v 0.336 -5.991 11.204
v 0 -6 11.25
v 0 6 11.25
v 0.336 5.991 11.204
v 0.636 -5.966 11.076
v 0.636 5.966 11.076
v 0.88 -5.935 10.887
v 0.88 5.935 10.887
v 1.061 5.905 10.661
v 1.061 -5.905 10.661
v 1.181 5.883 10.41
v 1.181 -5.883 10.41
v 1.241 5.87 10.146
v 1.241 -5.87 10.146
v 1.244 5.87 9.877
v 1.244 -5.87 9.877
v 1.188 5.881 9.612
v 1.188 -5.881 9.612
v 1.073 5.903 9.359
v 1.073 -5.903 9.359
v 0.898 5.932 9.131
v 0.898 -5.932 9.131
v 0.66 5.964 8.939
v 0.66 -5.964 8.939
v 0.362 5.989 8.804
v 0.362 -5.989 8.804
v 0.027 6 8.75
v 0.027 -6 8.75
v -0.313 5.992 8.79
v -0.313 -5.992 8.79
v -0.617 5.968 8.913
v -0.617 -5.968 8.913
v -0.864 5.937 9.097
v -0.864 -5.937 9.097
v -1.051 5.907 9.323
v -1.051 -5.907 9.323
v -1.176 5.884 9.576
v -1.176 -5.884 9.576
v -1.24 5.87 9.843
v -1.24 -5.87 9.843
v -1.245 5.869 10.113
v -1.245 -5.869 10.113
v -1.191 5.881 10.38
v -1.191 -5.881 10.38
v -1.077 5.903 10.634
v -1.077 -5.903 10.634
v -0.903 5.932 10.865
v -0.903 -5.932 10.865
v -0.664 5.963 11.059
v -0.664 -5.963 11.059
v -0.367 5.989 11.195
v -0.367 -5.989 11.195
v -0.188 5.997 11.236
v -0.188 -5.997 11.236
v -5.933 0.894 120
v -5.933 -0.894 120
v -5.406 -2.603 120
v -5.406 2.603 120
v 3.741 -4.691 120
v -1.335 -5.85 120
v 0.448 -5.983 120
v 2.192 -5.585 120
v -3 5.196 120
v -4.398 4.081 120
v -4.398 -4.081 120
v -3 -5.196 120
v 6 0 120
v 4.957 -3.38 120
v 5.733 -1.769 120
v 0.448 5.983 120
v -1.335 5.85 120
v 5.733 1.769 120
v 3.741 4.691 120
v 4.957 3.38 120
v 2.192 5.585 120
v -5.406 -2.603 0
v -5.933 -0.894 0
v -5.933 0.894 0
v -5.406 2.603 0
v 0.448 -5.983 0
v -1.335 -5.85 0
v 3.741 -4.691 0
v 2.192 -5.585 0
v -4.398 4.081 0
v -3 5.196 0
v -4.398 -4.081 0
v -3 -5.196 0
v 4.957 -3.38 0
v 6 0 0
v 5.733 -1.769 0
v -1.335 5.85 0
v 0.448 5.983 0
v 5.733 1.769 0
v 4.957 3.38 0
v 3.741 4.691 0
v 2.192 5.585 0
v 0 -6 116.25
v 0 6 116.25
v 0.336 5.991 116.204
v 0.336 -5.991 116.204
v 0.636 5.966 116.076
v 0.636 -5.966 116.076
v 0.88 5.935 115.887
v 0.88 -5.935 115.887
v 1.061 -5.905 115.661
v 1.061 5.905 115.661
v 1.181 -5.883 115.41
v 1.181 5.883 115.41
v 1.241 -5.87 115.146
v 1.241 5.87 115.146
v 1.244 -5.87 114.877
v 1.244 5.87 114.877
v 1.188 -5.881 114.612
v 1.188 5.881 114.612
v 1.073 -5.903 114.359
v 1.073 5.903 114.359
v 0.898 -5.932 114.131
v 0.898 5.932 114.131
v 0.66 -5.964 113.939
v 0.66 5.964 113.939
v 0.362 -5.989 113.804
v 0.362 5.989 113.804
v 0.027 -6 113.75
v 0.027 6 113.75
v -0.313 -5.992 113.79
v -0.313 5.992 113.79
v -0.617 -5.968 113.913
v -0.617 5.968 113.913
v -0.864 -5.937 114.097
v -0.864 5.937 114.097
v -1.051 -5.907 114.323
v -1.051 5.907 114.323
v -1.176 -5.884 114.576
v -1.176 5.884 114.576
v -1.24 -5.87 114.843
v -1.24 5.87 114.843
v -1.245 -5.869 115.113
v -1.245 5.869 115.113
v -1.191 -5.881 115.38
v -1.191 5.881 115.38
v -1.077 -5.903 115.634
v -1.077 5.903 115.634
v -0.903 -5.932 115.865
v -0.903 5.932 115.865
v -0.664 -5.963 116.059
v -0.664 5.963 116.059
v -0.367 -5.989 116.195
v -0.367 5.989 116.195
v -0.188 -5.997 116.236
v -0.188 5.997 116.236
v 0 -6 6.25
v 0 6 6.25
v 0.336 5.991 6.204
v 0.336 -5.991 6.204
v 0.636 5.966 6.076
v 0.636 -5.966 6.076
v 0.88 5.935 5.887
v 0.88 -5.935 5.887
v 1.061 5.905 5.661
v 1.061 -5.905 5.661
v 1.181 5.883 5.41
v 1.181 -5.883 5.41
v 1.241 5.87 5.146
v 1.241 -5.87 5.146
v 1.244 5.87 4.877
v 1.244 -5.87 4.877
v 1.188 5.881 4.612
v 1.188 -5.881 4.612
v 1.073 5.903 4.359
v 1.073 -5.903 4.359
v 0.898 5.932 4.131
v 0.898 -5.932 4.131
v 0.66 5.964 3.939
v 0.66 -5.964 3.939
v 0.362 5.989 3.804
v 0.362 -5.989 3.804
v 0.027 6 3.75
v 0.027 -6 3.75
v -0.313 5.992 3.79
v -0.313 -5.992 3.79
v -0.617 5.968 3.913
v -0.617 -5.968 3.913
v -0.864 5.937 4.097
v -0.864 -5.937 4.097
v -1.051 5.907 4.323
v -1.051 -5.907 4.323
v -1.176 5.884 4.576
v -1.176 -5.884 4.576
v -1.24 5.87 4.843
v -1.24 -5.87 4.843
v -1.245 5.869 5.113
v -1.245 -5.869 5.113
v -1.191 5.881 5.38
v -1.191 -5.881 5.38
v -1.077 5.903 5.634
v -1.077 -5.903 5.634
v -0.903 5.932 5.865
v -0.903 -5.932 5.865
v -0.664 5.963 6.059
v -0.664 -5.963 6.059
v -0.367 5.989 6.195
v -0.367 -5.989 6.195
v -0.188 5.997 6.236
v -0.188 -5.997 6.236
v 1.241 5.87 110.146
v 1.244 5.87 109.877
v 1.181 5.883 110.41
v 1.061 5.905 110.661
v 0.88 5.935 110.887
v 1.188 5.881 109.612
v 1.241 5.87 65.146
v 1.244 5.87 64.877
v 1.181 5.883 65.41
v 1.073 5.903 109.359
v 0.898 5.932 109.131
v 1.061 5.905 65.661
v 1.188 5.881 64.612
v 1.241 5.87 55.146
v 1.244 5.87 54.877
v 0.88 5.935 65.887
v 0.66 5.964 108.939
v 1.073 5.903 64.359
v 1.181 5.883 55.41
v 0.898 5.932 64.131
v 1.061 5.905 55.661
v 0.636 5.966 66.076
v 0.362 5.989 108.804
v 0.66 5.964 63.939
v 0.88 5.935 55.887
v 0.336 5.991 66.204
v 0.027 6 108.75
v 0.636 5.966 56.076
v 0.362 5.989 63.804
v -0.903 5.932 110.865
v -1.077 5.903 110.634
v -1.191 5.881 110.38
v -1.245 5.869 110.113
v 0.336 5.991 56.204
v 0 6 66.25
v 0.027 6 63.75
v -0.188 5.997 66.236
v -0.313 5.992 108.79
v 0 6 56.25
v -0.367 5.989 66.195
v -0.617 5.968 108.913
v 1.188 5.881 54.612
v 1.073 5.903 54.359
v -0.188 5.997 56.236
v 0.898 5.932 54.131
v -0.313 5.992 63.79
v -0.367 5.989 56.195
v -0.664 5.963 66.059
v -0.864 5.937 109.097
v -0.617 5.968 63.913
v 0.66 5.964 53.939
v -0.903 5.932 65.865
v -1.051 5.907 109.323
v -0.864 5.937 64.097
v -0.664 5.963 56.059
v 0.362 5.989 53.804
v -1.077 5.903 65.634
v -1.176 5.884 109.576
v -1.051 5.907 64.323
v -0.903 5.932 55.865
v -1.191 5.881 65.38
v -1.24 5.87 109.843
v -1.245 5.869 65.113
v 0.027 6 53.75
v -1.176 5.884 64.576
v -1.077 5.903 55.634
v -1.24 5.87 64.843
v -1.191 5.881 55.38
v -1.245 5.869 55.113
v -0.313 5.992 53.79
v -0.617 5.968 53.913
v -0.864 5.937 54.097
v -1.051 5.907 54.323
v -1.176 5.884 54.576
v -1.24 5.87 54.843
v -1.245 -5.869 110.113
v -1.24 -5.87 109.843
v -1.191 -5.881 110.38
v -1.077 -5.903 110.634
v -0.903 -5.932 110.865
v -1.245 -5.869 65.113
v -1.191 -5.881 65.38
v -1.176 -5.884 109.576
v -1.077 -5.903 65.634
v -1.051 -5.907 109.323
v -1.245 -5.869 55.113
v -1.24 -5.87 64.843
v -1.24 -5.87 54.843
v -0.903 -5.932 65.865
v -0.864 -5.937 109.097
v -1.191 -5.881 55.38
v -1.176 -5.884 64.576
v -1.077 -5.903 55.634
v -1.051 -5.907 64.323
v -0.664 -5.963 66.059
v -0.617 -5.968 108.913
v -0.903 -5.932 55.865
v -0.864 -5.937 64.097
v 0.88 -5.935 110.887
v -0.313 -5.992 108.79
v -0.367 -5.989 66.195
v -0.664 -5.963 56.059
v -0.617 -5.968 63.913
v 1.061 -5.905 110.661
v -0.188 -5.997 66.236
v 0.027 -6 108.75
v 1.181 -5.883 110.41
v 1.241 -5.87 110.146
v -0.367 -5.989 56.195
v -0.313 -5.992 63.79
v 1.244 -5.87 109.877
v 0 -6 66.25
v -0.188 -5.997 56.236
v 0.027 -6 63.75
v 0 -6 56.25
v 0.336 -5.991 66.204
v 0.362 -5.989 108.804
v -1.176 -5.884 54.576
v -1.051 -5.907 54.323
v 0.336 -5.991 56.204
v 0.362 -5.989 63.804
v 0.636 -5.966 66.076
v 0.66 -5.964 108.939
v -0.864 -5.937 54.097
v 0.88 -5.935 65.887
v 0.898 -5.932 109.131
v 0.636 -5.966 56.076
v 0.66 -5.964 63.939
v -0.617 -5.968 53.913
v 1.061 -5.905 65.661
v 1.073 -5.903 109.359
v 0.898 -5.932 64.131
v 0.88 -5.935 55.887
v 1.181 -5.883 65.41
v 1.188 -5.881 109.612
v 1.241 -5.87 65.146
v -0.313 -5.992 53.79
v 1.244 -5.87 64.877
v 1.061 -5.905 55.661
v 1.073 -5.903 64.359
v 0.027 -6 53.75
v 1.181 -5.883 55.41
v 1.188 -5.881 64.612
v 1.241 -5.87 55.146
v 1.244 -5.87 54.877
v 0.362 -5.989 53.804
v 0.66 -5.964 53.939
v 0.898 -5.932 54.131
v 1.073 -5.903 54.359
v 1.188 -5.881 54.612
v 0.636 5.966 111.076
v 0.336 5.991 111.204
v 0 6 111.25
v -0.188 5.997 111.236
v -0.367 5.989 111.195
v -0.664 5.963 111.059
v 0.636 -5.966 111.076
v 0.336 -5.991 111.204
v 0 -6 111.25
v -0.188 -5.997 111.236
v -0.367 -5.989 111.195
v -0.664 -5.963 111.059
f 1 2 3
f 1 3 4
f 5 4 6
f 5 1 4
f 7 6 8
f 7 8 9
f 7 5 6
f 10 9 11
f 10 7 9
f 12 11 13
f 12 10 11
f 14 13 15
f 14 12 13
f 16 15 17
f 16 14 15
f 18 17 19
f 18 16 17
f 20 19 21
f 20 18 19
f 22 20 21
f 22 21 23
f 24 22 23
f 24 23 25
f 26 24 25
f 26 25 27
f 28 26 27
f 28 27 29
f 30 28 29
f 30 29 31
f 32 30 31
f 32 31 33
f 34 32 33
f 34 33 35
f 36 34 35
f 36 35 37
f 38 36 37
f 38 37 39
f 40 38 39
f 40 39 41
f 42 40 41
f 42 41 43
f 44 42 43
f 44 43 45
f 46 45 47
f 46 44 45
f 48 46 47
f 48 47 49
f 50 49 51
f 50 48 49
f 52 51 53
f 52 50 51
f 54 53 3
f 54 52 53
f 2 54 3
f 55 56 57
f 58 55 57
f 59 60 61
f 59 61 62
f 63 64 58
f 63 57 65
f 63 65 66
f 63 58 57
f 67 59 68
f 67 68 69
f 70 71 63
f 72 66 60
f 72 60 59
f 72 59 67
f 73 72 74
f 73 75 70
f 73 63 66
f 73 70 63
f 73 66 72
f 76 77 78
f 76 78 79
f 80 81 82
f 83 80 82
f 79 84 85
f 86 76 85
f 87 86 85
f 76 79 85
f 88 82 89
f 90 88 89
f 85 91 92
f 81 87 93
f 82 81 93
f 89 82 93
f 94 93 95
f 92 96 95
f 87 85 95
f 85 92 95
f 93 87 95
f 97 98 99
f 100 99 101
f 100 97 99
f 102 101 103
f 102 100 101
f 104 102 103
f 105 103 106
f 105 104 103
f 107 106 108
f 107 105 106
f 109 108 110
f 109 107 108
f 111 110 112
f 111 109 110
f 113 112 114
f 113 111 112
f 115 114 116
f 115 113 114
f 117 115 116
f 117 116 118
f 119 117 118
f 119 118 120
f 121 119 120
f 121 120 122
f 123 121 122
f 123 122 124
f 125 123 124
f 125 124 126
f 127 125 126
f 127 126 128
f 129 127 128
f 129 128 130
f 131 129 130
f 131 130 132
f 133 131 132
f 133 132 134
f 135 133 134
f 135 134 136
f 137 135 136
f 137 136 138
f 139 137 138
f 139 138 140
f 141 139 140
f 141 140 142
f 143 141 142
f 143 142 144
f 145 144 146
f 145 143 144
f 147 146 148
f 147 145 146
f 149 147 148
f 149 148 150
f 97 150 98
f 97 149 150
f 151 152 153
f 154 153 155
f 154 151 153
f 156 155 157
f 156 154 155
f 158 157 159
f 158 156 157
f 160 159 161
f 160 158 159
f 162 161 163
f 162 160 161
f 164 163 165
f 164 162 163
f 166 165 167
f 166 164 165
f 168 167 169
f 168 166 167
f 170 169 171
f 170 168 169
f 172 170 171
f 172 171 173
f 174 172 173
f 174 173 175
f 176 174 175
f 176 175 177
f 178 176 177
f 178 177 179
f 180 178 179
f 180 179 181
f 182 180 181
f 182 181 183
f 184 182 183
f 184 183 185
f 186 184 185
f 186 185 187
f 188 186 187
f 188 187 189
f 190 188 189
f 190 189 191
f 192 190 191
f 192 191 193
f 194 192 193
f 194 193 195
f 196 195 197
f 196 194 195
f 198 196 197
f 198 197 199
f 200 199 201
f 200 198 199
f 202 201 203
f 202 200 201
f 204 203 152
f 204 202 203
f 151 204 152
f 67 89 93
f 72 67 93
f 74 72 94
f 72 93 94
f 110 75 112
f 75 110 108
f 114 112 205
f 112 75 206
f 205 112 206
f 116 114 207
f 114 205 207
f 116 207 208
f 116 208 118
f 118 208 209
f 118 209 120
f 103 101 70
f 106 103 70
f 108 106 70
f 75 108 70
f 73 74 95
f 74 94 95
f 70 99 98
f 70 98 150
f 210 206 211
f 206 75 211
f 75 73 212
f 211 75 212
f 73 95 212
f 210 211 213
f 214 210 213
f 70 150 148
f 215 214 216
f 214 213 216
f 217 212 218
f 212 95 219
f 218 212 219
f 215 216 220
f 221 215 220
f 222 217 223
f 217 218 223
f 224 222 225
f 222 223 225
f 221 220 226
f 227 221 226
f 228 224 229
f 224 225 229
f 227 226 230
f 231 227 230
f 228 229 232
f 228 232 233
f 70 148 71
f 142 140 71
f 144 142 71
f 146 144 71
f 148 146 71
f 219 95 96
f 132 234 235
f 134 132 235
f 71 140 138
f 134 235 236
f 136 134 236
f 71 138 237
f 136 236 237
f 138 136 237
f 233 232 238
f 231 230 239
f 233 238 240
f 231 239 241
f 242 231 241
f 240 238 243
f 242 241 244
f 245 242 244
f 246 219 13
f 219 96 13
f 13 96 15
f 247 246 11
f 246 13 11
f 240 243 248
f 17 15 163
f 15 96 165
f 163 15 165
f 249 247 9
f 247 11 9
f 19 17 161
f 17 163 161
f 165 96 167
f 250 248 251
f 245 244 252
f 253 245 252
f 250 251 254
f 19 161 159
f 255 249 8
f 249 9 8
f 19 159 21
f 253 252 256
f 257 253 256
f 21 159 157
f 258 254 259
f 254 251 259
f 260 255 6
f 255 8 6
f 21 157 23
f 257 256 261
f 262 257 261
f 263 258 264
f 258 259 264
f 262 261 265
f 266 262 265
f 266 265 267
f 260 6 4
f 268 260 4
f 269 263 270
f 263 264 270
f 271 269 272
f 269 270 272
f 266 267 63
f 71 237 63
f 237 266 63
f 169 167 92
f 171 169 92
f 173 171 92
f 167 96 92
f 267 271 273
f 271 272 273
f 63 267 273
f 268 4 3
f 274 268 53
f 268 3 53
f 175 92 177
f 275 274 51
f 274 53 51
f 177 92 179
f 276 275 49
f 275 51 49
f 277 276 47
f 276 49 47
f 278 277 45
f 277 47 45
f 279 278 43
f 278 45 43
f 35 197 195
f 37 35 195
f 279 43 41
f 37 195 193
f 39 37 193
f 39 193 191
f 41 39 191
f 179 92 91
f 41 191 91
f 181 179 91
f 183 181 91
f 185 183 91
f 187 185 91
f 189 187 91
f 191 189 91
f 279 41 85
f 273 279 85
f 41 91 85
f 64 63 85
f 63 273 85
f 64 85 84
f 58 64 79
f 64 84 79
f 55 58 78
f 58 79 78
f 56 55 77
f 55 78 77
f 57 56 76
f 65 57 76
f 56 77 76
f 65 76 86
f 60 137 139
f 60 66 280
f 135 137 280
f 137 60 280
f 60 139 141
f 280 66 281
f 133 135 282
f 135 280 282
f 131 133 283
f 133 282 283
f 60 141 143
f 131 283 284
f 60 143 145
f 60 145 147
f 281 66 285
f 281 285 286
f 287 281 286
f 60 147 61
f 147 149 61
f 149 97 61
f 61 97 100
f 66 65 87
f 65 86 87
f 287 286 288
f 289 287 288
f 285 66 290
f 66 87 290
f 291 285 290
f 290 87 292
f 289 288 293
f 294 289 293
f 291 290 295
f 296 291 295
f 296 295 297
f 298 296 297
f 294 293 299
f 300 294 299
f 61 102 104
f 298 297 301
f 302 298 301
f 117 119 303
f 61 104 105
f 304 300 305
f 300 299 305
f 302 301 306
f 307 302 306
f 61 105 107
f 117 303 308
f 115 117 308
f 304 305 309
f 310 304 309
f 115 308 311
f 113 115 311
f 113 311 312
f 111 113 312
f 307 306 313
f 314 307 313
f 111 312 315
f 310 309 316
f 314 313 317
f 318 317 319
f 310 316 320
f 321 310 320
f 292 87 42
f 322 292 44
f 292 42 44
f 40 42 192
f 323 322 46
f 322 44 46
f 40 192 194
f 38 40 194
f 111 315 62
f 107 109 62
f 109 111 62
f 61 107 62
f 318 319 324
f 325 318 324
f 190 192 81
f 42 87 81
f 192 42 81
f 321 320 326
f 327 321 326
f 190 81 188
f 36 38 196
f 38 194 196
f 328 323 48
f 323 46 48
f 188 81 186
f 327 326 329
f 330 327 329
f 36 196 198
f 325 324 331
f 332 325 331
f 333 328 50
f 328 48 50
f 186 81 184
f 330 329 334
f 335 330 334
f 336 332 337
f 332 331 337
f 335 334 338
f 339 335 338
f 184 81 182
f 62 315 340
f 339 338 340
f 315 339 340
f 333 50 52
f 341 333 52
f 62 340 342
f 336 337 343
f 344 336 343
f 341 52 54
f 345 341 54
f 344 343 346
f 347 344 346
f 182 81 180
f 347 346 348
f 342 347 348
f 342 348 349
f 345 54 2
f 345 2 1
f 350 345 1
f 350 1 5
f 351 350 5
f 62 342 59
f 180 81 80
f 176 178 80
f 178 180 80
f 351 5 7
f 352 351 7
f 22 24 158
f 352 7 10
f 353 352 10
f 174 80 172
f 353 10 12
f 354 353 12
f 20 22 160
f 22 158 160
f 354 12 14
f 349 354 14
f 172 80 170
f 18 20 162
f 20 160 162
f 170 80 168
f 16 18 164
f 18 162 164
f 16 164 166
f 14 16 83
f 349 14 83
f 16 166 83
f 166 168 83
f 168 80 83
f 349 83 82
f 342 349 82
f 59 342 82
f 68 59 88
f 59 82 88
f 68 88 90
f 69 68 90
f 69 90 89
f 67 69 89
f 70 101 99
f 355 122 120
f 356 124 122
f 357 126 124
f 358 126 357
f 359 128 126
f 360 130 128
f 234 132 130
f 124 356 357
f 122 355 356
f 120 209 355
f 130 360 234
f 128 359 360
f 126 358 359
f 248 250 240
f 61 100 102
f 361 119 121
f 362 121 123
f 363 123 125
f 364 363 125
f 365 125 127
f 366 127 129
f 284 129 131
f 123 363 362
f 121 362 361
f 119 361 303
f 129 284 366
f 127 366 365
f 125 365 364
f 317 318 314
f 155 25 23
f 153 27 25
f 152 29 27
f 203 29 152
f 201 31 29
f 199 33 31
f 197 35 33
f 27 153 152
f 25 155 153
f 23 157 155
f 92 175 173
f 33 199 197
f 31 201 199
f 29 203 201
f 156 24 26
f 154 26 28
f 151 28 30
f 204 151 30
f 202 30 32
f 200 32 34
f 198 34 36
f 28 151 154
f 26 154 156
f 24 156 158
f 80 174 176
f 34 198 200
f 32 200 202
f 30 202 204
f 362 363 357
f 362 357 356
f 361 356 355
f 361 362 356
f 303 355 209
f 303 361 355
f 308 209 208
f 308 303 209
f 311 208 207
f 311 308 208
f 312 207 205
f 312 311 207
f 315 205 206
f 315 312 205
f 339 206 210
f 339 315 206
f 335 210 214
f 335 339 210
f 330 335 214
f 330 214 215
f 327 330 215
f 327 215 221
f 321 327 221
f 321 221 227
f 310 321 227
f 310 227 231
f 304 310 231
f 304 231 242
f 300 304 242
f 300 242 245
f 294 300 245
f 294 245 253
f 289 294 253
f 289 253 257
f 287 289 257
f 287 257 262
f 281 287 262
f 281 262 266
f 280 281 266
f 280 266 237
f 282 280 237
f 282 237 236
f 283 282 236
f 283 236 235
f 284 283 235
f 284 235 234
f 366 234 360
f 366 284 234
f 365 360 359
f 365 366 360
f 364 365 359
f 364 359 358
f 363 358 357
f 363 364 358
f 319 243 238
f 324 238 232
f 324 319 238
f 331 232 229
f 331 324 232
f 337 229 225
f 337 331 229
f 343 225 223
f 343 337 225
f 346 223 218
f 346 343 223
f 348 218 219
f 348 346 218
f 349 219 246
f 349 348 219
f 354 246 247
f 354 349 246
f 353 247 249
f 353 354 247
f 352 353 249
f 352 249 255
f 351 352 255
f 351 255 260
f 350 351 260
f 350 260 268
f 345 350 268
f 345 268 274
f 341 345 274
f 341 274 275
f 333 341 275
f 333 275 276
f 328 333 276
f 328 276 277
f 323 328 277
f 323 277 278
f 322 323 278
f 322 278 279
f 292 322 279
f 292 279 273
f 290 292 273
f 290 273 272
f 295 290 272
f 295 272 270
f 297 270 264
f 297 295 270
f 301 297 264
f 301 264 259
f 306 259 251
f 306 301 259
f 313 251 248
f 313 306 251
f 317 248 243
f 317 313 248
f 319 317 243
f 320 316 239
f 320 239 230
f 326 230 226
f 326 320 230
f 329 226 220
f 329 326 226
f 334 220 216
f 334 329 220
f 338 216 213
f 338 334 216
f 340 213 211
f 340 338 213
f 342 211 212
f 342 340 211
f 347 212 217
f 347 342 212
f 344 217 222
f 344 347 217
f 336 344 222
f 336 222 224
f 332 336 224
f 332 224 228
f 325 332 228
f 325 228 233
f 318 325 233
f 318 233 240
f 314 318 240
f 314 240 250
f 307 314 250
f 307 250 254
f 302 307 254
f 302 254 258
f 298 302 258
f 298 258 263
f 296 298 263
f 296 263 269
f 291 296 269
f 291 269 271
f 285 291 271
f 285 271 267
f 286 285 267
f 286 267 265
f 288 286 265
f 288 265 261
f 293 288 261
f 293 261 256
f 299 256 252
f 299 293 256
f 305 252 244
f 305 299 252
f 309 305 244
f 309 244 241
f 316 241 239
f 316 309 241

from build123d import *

# Parameters (mm, degrees)
SKETCH1_R               = 6
BOSS_EXTRUDE1_DEPTH     = 120
CUT_EXTRUDE2_DEPTH      = 121.299625935
CUT_EXTRUDE2_DEPTH_BACK = 121.299625935
SKETCH12_R              = 1.25


with BuildPart() as part:
    # Sketch1 → Boss-Extrude1 (new body)
    with BuildSketch(Plane.XY):
        Circle(SKETCH1_R)
    extrude(amount=BOSS_EXTRUDE1_DEPTH)

    # Sketch12 → Cut-Extrude2 (cut, two sides: drawn at the far end of the back side and taken through both)
    with BuildSketch(Plane(origin=(0, 0, 0), x_dir=(1, 0, 0), z_dir=(0, 1, 0)).offset(-CUT_EXTRUDE2_DEPTH_BACK)):
        with Locations(Location((0, -5, 0), (0, 0, 270))):
            Circle(SKETCH12_R)
        with Locations(Location((0, -10, 0), (0, 0, 270))):
            Circle(SKETCH12_R)
        with Locations(Location((0, -65, 0), (0, 0, 270))):
            Circle(SKETCH12_R)
        with Locations(Location((0, -55, 0), (0, 0, 270))):
            Circle(SKETCH12_R)
        with Locations(Location((0, -110, 0), (0, 0, 270))):
            Circle(SKETCH12_R)
        with Locations(Location((0, -115, 0), (0, 0, 270))):
            Circle(SKETCH12_R)
    extrude(amount=CUT_EXTRUDE2_DEPTH + CUT_EXTRUDE2_DEPTH_BACK, mode=Mode.SUBTRACT)


solid = part.part
